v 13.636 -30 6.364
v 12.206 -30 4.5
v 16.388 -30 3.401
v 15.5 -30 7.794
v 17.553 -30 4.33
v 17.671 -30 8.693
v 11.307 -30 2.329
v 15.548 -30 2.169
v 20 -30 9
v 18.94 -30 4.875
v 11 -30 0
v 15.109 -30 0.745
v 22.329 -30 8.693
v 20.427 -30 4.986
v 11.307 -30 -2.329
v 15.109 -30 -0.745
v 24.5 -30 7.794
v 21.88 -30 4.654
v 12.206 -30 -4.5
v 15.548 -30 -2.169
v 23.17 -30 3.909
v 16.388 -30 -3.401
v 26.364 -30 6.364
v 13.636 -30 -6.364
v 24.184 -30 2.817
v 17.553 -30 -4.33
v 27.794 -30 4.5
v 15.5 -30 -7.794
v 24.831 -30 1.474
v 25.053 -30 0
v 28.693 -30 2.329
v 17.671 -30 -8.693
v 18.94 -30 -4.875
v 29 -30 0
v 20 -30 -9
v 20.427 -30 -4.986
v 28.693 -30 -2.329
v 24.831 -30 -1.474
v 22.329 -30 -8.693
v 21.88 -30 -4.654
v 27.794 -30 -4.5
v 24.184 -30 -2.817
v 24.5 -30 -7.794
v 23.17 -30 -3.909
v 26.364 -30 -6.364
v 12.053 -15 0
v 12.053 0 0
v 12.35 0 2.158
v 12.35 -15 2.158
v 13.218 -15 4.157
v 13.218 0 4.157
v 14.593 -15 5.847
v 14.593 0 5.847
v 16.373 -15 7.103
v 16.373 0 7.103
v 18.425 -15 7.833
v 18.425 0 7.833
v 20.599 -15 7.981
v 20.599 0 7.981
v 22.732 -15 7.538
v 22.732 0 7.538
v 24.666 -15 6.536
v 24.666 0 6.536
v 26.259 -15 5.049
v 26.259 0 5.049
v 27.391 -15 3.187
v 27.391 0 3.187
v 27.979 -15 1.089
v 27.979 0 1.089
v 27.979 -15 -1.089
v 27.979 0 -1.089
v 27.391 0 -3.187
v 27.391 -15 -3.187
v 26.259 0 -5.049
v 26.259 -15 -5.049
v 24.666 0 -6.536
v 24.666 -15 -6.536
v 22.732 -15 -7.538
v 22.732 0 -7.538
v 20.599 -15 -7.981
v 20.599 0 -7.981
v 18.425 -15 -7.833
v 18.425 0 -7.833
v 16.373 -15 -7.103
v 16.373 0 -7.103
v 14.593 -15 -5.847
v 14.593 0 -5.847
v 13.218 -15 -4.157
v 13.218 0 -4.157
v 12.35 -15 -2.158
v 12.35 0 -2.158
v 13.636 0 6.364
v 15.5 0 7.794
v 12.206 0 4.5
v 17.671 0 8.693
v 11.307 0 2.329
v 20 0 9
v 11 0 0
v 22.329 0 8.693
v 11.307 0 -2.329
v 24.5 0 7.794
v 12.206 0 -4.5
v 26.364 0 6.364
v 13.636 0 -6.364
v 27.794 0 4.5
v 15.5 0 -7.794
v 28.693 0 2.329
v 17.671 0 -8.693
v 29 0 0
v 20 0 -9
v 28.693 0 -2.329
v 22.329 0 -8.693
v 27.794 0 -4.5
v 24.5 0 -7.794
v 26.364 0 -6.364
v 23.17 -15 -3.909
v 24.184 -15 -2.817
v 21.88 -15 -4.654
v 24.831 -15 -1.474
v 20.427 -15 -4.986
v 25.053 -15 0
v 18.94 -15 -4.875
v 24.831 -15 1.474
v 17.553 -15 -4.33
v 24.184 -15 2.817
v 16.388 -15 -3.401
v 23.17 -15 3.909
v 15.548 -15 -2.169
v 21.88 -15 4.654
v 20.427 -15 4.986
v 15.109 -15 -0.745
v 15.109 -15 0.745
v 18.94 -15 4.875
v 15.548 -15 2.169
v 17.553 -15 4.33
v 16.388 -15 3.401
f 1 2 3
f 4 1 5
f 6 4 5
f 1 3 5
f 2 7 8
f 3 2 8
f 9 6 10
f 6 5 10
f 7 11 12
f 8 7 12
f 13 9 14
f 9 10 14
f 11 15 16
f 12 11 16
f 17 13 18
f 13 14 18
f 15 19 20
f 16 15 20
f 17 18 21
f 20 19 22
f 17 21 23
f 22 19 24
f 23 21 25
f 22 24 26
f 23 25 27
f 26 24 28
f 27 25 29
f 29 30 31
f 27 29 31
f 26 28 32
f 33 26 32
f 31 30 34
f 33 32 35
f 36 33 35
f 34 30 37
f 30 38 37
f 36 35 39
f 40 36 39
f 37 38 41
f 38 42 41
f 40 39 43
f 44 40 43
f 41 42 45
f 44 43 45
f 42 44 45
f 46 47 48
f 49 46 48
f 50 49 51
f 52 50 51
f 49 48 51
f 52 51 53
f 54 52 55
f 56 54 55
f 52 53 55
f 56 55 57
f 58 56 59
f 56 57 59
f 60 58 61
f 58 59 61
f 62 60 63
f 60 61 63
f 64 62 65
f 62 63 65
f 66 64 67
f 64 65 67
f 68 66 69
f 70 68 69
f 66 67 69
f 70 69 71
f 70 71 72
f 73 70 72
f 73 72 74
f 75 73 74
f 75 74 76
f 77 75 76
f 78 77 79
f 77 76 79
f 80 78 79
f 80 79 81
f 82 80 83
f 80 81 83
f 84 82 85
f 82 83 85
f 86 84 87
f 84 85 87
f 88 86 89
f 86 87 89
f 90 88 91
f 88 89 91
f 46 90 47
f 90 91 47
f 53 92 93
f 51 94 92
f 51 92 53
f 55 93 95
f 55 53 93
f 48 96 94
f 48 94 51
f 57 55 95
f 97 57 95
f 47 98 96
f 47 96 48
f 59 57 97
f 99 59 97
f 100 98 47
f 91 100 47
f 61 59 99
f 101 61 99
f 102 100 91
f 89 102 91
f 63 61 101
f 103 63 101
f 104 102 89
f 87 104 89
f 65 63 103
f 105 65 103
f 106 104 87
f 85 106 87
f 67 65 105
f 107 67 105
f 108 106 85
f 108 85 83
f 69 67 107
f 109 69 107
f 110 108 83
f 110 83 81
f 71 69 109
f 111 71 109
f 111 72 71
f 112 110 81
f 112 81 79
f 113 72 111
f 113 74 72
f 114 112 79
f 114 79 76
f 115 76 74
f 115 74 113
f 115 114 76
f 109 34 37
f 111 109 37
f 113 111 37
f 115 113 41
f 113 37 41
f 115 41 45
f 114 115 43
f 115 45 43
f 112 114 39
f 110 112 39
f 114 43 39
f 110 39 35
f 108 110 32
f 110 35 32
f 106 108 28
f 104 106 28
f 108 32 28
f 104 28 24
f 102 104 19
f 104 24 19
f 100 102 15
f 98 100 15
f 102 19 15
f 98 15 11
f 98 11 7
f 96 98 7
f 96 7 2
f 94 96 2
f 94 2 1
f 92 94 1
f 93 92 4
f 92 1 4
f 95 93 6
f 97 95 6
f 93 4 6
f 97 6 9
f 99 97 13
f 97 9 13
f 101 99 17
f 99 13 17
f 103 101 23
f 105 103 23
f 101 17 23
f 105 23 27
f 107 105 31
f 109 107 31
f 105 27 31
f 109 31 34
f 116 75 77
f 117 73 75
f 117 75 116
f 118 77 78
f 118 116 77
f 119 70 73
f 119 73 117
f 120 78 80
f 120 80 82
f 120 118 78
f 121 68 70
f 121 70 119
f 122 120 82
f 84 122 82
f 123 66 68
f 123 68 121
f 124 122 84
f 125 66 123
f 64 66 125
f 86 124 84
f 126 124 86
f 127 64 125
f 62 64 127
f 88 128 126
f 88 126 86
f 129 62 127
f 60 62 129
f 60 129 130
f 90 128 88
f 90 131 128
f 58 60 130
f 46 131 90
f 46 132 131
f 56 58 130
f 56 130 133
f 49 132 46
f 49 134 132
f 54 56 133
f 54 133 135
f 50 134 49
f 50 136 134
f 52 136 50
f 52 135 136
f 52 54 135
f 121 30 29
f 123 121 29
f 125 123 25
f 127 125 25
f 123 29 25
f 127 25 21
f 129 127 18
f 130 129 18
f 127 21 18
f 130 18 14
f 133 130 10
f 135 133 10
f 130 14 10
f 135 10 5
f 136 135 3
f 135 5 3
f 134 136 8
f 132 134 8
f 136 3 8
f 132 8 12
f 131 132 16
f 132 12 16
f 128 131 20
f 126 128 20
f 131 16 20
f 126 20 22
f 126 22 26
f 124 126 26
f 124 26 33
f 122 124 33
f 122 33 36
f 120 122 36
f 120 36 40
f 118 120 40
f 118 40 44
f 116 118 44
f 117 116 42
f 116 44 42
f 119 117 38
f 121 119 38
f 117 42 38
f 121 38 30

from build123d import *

# Parameters (mm, degrees)
SWEEP1_START       = -30
SWEEP1_OUTLINE_R   = 9
SWEEP1_DEPTH       = 30
SKETCH26_R         = 5
CUT_EXTRUDE1_DEPTH = 15
SKETCH27_R         = 8
CUT_EXTRUDE2_DEPTH = 15


# Read off the part's stored shape, not the designer's step: Sweep1
with BuildPart() as part:
    # Sweep1 outline → Sweep1 (new body)
    with BuildSketch(Plane(origin=(0, 0, 0), x_dir=(1, 0, 0), z_dir=(0, 1, 0)).offset(SWEEP1_START)):
        with Locations((20, 0)):
            Circle(SWEEP1_OUTLINE_R)
    extrude(amount=SWEEP1_DEPTH)

    # Sketch26 → Cut-Extrude1 (cut)
    with BuildSketch(Plane(origin=(0, -30, 0), x_dir=(-1, 0, 0), z_dir=(0, -1, 0))):
        with Locations(Location((-20.053022343, 0, 0), (0, 0, 180))):
            Circle(SKETCH26_R)
    extrude(amount=-CUT_EXTRUDE1_DEPTH, mode=Mode.SUBTRACT)

    # Sketch27 → Cut-Extrude2 (cut)
    with BuildSketch(Plane(origin=(0, 0, 0), x_dir=(1, 0, 0), z_dir=(0, 1, 0))):
        with Locations(Location((20.053022343, 0, 0), (0, 0, 180))):
            Circle(SKETCH27_R)
    extrude(amount=-CUT_EXTRUDE2_DEPTH, mode=Mode.SUBTRACT)


solid = part.part
